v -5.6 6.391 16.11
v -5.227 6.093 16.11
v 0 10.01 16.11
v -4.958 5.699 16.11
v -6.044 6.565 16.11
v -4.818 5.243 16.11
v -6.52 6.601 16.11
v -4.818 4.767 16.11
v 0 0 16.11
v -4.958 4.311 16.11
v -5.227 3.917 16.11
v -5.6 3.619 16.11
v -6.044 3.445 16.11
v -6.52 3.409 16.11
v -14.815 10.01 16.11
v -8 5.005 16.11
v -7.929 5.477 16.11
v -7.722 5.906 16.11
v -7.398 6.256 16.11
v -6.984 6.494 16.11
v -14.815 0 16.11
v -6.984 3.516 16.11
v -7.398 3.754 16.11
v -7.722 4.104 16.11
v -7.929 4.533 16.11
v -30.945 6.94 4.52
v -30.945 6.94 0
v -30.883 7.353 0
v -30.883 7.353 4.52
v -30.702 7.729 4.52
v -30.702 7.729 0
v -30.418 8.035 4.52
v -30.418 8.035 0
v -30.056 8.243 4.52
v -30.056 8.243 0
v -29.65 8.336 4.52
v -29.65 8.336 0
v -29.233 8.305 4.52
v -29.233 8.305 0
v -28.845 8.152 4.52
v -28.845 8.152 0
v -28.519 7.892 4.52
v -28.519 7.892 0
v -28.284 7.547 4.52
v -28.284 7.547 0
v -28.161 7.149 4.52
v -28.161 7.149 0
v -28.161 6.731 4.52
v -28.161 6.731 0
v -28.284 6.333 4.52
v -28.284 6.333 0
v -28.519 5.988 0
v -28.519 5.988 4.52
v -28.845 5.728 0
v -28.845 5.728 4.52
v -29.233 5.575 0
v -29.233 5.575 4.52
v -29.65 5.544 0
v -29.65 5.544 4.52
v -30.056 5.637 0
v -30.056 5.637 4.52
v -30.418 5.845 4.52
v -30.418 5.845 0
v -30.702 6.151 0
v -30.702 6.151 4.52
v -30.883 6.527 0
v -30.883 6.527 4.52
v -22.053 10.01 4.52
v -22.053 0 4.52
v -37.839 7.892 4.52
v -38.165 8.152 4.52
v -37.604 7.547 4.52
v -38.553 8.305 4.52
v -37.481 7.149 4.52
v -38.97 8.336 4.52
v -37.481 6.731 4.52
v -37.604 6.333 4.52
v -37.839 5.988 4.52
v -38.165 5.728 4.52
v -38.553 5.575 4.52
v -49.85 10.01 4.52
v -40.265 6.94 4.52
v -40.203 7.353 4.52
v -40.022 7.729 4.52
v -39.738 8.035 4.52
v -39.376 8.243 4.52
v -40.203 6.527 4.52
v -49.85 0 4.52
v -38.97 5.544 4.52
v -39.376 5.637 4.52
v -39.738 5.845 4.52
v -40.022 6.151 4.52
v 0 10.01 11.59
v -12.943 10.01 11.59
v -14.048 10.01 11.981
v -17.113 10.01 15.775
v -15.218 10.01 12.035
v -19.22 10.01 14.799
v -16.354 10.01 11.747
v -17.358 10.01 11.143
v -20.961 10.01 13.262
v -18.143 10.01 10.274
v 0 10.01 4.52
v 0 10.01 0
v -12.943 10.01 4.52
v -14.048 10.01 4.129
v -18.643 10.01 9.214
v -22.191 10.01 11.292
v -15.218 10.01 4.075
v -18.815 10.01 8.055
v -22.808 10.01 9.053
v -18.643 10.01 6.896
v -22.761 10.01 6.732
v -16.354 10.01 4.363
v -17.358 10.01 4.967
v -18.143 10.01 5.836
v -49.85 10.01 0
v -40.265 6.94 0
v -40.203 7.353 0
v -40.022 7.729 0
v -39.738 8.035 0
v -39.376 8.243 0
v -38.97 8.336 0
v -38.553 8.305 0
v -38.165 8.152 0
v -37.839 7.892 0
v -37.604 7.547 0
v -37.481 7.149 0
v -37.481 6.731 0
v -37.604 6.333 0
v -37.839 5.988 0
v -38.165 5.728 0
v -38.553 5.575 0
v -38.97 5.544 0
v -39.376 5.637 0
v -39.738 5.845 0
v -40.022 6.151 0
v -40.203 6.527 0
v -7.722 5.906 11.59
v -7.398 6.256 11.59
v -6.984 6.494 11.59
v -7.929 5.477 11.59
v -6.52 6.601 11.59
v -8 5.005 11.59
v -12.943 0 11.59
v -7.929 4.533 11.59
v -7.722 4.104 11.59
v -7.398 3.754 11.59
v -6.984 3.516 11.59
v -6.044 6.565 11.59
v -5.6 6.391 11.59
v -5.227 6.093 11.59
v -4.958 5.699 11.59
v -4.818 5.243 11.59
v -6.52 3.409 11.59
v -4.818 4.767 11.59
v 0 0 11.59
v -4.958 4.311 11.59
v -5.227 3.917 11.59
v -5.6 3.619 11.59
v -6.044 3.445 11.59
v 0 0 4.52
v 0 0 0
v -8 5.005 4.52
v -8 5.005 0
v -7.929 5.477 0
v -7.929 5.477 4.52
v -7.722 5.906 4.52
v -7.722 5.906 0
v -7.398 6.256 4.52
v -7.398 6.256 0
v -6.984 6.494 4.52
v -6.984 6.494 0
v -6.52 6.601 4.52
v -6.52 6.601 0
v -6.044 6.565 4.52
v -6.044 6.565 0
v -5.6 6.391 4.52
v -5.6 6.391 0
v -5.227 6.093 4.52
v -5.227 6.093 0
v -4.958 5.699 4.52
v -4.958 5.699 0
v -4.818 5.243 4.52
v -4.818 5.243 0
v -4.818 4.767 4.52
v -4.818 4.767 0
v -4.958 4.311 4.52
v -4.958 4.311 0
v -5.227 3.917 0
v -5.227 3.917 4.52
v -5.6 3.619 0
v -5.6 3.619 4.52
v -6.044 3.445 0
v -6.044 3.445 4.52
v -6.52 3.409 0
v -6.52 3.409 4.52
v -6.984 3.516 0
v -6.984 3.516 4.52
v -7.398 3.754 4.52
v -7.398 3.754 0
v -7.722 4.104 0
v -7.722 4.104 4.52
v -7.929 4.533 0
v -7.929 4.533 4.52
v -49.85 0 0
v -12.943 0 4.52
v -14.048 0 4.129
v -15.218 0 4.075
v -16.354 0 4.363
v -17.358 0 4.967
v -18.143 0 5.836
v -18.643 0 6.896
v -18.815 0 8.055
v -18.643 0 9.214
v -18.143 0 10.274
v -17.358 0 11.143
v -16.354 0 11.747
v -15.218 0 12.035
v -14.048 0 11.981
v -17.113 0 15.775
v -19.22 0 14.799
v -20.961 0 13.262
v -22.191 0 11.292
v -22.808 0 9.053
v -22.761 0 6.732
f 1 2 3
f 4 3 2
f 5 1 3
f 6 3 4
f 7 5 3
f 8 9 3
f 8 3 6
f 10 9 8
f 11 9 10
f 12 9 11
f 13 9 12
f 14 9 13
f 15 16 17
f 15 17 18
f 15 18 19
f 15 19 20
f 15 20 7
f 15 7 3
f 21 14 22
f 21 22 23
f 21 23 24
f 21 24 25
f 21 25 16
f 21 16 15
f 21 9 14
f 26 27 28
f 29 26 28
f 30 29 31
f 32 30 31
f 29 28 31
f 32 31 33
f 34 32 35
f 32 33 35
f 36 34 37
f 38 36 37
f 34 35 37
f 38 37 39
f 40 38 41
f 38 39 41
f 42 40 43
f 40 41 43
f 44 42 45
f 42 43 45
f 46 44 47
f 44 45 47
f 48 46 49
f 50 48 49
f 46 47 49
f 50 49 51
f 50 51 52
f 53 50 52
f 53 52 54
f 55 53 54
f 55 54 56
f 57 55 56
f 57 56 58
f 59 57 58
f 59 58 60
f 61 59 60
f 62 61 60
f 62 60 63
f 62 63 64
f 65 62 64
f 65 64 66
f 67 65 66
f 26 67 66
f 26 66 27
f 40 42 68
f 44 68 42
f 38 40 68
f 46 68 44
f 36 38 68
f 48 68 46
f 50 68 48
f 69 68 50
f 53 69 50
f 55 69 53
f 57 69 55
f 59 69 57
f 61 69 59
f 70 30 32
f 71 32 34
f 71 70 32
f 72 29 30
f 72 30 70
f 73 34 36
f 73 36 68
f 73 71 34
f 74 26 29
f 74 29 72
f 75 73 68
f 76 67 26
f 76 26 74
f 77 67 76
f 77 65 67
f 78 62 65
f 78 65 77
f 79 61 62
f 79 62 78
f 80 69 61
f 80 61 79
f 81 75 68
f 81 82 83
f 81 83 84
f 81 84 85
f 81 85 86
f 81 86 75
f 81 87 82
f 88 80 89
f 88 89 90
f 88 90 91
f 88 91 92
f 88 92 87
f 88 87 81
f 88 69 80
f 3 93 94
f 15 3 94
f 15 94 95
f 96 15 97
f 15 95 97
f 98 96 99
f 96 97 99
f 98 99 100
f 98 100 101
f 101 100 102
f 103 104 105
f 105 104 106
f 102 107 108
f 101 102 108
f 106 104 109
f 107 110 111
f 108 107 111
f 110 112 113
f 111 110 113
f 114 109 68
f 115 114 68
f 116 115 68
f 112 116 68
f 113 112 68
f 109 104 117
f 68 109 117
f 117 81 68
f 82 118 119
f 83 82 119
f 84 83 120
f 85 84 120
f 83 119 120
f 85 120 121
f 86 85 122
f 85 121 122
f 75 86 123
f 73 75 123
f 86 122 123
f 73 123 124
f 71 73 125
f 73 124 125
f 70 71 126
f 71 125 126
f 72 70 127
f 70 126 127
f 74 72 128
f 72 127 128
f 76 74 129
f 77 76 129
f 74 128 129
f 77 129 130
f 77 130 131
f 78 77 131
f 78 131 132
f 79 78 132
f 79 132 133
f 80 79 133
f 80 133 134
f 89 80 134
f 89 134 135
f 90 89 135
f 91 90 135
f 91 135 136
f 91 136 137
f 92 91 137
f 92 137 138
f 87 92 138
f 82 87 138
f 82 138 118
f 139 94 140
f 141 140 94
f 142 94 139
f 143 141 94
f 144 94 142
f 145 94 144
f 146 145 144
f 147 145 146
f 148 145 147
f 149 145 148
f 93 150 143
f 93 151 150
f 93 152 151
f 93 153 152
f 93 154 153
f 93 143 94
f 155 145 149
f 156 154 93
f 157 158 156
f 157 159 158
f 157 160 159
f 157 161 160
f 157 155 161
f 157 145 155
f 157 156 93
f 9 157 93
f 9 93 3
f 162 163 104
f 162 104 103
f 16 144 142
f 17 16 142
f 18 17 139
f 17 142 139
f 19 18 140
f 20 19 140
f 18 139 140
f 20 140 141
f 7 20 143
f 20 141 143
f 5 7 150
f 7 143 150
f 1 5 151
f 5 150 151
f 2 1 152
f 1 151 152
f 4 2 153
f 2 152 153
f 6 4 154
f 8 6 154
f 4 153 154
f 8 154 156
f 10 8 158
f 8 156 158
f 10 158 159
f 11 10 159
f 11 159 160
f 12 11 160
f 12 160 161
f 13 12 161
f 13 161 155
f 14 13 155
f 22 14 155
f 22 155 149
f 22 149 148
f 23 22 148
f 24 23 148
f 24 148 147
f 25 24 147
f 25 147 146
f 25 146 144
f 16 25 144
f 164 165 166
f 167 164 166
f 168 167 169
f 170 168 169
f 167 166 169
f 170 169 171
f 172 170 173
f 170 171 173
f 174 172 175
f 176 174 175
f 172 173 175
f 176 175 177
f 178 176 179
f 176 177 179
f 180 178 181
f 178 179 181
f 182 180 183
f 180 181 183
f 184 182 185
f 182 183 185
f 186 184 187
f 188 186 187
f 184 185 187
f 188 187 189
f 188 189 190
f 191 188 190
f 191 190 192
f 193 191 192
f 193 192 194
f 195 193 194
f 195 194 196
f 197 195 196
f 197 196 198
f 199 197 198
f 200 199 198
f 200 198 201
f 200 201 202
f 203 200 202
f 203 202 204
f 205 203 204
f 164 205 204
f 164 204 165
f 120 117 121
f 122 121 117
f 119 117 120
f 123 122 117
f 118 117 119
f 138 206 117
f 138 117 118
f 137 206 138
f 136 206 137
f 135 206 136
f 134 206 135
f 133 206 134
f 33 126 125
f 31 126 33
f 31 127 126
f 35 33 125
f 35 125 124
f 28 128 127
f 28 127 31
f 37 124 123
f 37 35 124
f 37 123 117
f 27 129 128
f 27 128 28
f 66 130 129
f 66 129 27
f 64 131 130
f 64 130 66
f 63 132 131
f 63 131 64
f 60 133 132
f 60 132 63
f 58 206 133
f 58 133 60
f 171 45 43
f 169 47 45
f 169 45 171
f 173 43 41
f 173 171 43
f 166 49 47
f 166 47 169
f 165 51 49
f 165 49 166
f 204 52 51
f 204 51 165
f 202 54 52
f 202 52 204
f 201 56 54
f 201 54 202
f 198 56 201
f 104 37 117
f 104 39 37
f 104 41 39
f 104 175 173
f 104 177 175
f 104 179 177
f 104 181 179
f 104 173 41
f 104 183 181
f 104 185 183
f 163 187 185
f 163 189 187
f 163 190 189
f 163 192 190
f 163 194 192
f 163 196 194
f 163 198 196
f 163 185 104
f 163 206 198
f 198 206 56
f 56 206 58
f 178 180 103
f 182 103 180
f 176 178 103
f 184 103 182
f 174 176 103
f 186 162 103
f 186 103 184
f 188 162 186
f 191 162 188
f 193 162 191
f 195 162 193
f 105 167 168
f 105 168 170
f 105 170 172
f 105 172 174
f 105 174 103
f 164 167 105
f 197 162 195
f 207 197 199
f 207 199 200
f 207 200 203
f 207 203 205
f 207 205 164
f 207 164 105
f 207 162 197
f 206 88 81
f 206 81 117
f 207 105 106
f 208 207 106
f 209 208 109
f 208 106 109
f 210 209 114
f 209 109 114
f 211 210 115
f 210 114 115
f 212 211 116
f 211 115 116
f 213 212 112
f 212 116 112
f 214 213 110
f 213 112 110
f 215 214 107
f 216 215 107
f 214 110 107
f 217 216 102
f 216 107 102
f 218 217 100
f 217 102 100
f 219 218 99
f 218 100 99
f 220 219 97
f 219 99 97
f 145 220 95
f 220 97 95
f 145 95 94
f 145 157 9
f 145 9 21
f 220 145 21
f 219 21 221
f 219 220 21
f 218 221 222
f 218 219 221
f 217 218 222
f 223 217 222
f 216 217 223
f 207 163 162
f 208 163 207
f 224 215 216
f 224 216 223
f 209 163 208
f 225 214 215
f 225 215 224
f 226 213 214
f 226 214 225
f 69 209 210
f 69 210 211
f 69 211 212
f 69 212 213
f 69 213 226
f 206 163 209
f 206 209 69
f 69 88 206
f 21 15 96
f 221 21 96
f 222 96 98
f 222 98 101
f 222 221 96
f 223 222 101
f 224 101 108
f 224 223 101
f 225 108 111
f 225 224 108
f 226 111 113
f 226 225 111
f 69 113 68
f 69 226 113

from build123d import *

# Parameters (mm, degrees)
BOSS_EXTRUDE1_DEPTH = 10.01
SKETCH2_R           = 4
CUT_EXTRUDE1_DEPTH  = 11.01
SKETCH3_R           = 1.6
CUT_EXTRUDE2_DEPTH  = 17.11
CUT_EXTRUDE3_REACH  = 18.11
SKETCH5_R           = 1.4


with BuildPart() as part:
    # Sketch1 → Boss-Extrude1 (new body)
    with BuildSketch(Plane(origin=(0, 0, 0), x_dir=(1, 0, 0), z_dir=(0, 1, 0))):
        with BuildLine():
            Line((-49.85, 0), (0, 0))
            Line((0, 0), (0, -4.52))
            Line((0, -4.52), (-14.815, -4.52))
            ThreePointArc((-14.815, -4.52), (-18.35, -8.055), (-14.815, -11.59))
            Line((-14.815, -11.59), (0, -11.59))
            Line((0, -11.59), (0, -16.11))
            Line((0, -16.11), (-14.815, -16.11))
            ThreePointArc((-14.815, -16.11), (-21.647183033, -12.32164974), (-22.052872616, -4.52))
            Line((-22.052872616, -4.52), (-49.85, -4.52))
            Line((-49.85, -4.52), (-49.85, 0))
        make_face()
    extrude(amount=BOSS_EXTRUDE1_DEPTH)

    # Sketch2 → Cut-Extrude1 (cut, through all)
    with BuildSketch(Plane(origin=(0, 10.01, 0), x_dir=(1, 0, 0), z_dir=(0, 1, 0))):
        with Locations((-14.815, -8.055)):
            Circle(SKETCH2_R)
    extrude(amount=-CUT_EXTRUDE1_DEPTH, mode=Mode.SUBTRACT)

    # Sketch3 → Cut-Extrude2 (cut, through all)
    with BuildSketch(Plane(origin=(0, 0, 0), x_dir=(-1, 0, 0), z_dir=(0, 0, -1))):
        with Locations((6.39994888, 5.005)):
            Circle(SKETCH3_R)
    extrude(amount=-CUT_EXTRUDE2_DEPTH, mode=Mode.SUBTRACT)

    # Sketch5 → Cut-Extrude3 (cut, up to next)
    with BuildSketch(Plane(origin=(0, 0, 0), x_dir=(-1, 0, 0), z_dir=(0, 0, -1)), mode=Mode.PRIVATE) as cut_extrude3_sk1:
        with Locations((29.545, 6.94)):
            Circle(SKETCH5_R)
    cut_extrude3_tool1 = extrude(cut_extrude3_sk1.sketch, amount=-CUT_EXTRUDE3_REACH, mode=Mode.PRIVATE) & part.part
    add(cut_extrude3_tool1.solids().sort_by_distance((-29.545, 6.94, 0))[0], mode=Mode.SUBTRACT)
    # Sketch5 → Cut-Extrude3 (cut, up to next)
    with BuildSketch(Plane(origin=(0, 0, 0), x_dir=(-1, 0, 0), z_dir=(0, 0, -1)), mode=Mode.PRIVATE) as cut_extrude3_sk2:
        with Locations((38.865, 6.94)):
            Circle(SKETCH5_R)
    cut_extrude3_tool2 = extrude(cut_extrude3_sk2.sketch, amount=-CUT_EXTRUDE3_REACH, mode=Mode.PRIVATE) & part.part
    add(cut_extrude3_tool2.solids().sort_by_distance((-38.865, 6.94, 0))[0], mode=Mode.SUBTRACT)


solid = part.part
